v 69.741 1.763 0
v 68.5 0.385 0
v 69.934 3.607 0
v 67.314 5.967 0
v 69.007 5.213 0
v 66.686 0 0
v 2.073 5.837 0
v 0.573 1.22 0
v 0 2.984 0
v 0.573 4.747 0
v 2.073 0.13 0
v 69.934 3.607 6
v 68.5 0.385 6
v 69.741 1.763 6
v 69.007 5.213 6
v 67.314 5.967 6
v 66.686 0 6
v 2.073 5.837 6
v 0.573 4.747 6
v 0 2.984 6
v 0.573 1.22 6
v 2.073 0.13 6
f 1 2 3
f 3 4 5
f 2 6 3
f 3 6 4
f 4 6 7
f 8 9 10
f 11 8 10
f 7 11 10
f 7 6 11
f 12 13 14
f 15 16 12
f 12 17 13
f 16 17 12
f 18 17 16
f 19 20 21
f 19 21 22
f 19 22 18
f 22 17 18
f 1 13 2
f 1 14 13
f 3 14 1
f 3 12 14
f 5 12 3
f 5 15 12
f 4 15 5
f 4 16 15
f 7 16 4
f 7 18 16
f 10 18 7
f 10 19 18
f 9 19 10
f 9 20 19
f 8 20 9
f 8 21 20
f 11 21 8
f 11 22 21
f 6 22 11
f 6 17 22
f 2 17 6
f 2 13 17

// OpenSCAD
$fn = 32;

// ----------------------------------------------------------------------
// Key bar: parallel key, 6 mm thick
// ----------------------------------------------------------------------

// --- parameters (mm) ---
profile_height = 6;       // extrusion height
profile_points = 11;      // points of the closed outline

profile = [[0, 2.984], [0.573, 1.22], [2.073, 0.13], [66.686, 0], [68.5, 0.385], [69.741, 1.763], [69.934, 3.607], [69.007, 5.213], [67.314, 5.967], [2.073, 5.837], [0.573, 4.747]];  // single closed polygon, 11 points, counter clockwise

// --- the one profile operation ---
linear_extrude(height = profile_height) polygon(points = profile);
